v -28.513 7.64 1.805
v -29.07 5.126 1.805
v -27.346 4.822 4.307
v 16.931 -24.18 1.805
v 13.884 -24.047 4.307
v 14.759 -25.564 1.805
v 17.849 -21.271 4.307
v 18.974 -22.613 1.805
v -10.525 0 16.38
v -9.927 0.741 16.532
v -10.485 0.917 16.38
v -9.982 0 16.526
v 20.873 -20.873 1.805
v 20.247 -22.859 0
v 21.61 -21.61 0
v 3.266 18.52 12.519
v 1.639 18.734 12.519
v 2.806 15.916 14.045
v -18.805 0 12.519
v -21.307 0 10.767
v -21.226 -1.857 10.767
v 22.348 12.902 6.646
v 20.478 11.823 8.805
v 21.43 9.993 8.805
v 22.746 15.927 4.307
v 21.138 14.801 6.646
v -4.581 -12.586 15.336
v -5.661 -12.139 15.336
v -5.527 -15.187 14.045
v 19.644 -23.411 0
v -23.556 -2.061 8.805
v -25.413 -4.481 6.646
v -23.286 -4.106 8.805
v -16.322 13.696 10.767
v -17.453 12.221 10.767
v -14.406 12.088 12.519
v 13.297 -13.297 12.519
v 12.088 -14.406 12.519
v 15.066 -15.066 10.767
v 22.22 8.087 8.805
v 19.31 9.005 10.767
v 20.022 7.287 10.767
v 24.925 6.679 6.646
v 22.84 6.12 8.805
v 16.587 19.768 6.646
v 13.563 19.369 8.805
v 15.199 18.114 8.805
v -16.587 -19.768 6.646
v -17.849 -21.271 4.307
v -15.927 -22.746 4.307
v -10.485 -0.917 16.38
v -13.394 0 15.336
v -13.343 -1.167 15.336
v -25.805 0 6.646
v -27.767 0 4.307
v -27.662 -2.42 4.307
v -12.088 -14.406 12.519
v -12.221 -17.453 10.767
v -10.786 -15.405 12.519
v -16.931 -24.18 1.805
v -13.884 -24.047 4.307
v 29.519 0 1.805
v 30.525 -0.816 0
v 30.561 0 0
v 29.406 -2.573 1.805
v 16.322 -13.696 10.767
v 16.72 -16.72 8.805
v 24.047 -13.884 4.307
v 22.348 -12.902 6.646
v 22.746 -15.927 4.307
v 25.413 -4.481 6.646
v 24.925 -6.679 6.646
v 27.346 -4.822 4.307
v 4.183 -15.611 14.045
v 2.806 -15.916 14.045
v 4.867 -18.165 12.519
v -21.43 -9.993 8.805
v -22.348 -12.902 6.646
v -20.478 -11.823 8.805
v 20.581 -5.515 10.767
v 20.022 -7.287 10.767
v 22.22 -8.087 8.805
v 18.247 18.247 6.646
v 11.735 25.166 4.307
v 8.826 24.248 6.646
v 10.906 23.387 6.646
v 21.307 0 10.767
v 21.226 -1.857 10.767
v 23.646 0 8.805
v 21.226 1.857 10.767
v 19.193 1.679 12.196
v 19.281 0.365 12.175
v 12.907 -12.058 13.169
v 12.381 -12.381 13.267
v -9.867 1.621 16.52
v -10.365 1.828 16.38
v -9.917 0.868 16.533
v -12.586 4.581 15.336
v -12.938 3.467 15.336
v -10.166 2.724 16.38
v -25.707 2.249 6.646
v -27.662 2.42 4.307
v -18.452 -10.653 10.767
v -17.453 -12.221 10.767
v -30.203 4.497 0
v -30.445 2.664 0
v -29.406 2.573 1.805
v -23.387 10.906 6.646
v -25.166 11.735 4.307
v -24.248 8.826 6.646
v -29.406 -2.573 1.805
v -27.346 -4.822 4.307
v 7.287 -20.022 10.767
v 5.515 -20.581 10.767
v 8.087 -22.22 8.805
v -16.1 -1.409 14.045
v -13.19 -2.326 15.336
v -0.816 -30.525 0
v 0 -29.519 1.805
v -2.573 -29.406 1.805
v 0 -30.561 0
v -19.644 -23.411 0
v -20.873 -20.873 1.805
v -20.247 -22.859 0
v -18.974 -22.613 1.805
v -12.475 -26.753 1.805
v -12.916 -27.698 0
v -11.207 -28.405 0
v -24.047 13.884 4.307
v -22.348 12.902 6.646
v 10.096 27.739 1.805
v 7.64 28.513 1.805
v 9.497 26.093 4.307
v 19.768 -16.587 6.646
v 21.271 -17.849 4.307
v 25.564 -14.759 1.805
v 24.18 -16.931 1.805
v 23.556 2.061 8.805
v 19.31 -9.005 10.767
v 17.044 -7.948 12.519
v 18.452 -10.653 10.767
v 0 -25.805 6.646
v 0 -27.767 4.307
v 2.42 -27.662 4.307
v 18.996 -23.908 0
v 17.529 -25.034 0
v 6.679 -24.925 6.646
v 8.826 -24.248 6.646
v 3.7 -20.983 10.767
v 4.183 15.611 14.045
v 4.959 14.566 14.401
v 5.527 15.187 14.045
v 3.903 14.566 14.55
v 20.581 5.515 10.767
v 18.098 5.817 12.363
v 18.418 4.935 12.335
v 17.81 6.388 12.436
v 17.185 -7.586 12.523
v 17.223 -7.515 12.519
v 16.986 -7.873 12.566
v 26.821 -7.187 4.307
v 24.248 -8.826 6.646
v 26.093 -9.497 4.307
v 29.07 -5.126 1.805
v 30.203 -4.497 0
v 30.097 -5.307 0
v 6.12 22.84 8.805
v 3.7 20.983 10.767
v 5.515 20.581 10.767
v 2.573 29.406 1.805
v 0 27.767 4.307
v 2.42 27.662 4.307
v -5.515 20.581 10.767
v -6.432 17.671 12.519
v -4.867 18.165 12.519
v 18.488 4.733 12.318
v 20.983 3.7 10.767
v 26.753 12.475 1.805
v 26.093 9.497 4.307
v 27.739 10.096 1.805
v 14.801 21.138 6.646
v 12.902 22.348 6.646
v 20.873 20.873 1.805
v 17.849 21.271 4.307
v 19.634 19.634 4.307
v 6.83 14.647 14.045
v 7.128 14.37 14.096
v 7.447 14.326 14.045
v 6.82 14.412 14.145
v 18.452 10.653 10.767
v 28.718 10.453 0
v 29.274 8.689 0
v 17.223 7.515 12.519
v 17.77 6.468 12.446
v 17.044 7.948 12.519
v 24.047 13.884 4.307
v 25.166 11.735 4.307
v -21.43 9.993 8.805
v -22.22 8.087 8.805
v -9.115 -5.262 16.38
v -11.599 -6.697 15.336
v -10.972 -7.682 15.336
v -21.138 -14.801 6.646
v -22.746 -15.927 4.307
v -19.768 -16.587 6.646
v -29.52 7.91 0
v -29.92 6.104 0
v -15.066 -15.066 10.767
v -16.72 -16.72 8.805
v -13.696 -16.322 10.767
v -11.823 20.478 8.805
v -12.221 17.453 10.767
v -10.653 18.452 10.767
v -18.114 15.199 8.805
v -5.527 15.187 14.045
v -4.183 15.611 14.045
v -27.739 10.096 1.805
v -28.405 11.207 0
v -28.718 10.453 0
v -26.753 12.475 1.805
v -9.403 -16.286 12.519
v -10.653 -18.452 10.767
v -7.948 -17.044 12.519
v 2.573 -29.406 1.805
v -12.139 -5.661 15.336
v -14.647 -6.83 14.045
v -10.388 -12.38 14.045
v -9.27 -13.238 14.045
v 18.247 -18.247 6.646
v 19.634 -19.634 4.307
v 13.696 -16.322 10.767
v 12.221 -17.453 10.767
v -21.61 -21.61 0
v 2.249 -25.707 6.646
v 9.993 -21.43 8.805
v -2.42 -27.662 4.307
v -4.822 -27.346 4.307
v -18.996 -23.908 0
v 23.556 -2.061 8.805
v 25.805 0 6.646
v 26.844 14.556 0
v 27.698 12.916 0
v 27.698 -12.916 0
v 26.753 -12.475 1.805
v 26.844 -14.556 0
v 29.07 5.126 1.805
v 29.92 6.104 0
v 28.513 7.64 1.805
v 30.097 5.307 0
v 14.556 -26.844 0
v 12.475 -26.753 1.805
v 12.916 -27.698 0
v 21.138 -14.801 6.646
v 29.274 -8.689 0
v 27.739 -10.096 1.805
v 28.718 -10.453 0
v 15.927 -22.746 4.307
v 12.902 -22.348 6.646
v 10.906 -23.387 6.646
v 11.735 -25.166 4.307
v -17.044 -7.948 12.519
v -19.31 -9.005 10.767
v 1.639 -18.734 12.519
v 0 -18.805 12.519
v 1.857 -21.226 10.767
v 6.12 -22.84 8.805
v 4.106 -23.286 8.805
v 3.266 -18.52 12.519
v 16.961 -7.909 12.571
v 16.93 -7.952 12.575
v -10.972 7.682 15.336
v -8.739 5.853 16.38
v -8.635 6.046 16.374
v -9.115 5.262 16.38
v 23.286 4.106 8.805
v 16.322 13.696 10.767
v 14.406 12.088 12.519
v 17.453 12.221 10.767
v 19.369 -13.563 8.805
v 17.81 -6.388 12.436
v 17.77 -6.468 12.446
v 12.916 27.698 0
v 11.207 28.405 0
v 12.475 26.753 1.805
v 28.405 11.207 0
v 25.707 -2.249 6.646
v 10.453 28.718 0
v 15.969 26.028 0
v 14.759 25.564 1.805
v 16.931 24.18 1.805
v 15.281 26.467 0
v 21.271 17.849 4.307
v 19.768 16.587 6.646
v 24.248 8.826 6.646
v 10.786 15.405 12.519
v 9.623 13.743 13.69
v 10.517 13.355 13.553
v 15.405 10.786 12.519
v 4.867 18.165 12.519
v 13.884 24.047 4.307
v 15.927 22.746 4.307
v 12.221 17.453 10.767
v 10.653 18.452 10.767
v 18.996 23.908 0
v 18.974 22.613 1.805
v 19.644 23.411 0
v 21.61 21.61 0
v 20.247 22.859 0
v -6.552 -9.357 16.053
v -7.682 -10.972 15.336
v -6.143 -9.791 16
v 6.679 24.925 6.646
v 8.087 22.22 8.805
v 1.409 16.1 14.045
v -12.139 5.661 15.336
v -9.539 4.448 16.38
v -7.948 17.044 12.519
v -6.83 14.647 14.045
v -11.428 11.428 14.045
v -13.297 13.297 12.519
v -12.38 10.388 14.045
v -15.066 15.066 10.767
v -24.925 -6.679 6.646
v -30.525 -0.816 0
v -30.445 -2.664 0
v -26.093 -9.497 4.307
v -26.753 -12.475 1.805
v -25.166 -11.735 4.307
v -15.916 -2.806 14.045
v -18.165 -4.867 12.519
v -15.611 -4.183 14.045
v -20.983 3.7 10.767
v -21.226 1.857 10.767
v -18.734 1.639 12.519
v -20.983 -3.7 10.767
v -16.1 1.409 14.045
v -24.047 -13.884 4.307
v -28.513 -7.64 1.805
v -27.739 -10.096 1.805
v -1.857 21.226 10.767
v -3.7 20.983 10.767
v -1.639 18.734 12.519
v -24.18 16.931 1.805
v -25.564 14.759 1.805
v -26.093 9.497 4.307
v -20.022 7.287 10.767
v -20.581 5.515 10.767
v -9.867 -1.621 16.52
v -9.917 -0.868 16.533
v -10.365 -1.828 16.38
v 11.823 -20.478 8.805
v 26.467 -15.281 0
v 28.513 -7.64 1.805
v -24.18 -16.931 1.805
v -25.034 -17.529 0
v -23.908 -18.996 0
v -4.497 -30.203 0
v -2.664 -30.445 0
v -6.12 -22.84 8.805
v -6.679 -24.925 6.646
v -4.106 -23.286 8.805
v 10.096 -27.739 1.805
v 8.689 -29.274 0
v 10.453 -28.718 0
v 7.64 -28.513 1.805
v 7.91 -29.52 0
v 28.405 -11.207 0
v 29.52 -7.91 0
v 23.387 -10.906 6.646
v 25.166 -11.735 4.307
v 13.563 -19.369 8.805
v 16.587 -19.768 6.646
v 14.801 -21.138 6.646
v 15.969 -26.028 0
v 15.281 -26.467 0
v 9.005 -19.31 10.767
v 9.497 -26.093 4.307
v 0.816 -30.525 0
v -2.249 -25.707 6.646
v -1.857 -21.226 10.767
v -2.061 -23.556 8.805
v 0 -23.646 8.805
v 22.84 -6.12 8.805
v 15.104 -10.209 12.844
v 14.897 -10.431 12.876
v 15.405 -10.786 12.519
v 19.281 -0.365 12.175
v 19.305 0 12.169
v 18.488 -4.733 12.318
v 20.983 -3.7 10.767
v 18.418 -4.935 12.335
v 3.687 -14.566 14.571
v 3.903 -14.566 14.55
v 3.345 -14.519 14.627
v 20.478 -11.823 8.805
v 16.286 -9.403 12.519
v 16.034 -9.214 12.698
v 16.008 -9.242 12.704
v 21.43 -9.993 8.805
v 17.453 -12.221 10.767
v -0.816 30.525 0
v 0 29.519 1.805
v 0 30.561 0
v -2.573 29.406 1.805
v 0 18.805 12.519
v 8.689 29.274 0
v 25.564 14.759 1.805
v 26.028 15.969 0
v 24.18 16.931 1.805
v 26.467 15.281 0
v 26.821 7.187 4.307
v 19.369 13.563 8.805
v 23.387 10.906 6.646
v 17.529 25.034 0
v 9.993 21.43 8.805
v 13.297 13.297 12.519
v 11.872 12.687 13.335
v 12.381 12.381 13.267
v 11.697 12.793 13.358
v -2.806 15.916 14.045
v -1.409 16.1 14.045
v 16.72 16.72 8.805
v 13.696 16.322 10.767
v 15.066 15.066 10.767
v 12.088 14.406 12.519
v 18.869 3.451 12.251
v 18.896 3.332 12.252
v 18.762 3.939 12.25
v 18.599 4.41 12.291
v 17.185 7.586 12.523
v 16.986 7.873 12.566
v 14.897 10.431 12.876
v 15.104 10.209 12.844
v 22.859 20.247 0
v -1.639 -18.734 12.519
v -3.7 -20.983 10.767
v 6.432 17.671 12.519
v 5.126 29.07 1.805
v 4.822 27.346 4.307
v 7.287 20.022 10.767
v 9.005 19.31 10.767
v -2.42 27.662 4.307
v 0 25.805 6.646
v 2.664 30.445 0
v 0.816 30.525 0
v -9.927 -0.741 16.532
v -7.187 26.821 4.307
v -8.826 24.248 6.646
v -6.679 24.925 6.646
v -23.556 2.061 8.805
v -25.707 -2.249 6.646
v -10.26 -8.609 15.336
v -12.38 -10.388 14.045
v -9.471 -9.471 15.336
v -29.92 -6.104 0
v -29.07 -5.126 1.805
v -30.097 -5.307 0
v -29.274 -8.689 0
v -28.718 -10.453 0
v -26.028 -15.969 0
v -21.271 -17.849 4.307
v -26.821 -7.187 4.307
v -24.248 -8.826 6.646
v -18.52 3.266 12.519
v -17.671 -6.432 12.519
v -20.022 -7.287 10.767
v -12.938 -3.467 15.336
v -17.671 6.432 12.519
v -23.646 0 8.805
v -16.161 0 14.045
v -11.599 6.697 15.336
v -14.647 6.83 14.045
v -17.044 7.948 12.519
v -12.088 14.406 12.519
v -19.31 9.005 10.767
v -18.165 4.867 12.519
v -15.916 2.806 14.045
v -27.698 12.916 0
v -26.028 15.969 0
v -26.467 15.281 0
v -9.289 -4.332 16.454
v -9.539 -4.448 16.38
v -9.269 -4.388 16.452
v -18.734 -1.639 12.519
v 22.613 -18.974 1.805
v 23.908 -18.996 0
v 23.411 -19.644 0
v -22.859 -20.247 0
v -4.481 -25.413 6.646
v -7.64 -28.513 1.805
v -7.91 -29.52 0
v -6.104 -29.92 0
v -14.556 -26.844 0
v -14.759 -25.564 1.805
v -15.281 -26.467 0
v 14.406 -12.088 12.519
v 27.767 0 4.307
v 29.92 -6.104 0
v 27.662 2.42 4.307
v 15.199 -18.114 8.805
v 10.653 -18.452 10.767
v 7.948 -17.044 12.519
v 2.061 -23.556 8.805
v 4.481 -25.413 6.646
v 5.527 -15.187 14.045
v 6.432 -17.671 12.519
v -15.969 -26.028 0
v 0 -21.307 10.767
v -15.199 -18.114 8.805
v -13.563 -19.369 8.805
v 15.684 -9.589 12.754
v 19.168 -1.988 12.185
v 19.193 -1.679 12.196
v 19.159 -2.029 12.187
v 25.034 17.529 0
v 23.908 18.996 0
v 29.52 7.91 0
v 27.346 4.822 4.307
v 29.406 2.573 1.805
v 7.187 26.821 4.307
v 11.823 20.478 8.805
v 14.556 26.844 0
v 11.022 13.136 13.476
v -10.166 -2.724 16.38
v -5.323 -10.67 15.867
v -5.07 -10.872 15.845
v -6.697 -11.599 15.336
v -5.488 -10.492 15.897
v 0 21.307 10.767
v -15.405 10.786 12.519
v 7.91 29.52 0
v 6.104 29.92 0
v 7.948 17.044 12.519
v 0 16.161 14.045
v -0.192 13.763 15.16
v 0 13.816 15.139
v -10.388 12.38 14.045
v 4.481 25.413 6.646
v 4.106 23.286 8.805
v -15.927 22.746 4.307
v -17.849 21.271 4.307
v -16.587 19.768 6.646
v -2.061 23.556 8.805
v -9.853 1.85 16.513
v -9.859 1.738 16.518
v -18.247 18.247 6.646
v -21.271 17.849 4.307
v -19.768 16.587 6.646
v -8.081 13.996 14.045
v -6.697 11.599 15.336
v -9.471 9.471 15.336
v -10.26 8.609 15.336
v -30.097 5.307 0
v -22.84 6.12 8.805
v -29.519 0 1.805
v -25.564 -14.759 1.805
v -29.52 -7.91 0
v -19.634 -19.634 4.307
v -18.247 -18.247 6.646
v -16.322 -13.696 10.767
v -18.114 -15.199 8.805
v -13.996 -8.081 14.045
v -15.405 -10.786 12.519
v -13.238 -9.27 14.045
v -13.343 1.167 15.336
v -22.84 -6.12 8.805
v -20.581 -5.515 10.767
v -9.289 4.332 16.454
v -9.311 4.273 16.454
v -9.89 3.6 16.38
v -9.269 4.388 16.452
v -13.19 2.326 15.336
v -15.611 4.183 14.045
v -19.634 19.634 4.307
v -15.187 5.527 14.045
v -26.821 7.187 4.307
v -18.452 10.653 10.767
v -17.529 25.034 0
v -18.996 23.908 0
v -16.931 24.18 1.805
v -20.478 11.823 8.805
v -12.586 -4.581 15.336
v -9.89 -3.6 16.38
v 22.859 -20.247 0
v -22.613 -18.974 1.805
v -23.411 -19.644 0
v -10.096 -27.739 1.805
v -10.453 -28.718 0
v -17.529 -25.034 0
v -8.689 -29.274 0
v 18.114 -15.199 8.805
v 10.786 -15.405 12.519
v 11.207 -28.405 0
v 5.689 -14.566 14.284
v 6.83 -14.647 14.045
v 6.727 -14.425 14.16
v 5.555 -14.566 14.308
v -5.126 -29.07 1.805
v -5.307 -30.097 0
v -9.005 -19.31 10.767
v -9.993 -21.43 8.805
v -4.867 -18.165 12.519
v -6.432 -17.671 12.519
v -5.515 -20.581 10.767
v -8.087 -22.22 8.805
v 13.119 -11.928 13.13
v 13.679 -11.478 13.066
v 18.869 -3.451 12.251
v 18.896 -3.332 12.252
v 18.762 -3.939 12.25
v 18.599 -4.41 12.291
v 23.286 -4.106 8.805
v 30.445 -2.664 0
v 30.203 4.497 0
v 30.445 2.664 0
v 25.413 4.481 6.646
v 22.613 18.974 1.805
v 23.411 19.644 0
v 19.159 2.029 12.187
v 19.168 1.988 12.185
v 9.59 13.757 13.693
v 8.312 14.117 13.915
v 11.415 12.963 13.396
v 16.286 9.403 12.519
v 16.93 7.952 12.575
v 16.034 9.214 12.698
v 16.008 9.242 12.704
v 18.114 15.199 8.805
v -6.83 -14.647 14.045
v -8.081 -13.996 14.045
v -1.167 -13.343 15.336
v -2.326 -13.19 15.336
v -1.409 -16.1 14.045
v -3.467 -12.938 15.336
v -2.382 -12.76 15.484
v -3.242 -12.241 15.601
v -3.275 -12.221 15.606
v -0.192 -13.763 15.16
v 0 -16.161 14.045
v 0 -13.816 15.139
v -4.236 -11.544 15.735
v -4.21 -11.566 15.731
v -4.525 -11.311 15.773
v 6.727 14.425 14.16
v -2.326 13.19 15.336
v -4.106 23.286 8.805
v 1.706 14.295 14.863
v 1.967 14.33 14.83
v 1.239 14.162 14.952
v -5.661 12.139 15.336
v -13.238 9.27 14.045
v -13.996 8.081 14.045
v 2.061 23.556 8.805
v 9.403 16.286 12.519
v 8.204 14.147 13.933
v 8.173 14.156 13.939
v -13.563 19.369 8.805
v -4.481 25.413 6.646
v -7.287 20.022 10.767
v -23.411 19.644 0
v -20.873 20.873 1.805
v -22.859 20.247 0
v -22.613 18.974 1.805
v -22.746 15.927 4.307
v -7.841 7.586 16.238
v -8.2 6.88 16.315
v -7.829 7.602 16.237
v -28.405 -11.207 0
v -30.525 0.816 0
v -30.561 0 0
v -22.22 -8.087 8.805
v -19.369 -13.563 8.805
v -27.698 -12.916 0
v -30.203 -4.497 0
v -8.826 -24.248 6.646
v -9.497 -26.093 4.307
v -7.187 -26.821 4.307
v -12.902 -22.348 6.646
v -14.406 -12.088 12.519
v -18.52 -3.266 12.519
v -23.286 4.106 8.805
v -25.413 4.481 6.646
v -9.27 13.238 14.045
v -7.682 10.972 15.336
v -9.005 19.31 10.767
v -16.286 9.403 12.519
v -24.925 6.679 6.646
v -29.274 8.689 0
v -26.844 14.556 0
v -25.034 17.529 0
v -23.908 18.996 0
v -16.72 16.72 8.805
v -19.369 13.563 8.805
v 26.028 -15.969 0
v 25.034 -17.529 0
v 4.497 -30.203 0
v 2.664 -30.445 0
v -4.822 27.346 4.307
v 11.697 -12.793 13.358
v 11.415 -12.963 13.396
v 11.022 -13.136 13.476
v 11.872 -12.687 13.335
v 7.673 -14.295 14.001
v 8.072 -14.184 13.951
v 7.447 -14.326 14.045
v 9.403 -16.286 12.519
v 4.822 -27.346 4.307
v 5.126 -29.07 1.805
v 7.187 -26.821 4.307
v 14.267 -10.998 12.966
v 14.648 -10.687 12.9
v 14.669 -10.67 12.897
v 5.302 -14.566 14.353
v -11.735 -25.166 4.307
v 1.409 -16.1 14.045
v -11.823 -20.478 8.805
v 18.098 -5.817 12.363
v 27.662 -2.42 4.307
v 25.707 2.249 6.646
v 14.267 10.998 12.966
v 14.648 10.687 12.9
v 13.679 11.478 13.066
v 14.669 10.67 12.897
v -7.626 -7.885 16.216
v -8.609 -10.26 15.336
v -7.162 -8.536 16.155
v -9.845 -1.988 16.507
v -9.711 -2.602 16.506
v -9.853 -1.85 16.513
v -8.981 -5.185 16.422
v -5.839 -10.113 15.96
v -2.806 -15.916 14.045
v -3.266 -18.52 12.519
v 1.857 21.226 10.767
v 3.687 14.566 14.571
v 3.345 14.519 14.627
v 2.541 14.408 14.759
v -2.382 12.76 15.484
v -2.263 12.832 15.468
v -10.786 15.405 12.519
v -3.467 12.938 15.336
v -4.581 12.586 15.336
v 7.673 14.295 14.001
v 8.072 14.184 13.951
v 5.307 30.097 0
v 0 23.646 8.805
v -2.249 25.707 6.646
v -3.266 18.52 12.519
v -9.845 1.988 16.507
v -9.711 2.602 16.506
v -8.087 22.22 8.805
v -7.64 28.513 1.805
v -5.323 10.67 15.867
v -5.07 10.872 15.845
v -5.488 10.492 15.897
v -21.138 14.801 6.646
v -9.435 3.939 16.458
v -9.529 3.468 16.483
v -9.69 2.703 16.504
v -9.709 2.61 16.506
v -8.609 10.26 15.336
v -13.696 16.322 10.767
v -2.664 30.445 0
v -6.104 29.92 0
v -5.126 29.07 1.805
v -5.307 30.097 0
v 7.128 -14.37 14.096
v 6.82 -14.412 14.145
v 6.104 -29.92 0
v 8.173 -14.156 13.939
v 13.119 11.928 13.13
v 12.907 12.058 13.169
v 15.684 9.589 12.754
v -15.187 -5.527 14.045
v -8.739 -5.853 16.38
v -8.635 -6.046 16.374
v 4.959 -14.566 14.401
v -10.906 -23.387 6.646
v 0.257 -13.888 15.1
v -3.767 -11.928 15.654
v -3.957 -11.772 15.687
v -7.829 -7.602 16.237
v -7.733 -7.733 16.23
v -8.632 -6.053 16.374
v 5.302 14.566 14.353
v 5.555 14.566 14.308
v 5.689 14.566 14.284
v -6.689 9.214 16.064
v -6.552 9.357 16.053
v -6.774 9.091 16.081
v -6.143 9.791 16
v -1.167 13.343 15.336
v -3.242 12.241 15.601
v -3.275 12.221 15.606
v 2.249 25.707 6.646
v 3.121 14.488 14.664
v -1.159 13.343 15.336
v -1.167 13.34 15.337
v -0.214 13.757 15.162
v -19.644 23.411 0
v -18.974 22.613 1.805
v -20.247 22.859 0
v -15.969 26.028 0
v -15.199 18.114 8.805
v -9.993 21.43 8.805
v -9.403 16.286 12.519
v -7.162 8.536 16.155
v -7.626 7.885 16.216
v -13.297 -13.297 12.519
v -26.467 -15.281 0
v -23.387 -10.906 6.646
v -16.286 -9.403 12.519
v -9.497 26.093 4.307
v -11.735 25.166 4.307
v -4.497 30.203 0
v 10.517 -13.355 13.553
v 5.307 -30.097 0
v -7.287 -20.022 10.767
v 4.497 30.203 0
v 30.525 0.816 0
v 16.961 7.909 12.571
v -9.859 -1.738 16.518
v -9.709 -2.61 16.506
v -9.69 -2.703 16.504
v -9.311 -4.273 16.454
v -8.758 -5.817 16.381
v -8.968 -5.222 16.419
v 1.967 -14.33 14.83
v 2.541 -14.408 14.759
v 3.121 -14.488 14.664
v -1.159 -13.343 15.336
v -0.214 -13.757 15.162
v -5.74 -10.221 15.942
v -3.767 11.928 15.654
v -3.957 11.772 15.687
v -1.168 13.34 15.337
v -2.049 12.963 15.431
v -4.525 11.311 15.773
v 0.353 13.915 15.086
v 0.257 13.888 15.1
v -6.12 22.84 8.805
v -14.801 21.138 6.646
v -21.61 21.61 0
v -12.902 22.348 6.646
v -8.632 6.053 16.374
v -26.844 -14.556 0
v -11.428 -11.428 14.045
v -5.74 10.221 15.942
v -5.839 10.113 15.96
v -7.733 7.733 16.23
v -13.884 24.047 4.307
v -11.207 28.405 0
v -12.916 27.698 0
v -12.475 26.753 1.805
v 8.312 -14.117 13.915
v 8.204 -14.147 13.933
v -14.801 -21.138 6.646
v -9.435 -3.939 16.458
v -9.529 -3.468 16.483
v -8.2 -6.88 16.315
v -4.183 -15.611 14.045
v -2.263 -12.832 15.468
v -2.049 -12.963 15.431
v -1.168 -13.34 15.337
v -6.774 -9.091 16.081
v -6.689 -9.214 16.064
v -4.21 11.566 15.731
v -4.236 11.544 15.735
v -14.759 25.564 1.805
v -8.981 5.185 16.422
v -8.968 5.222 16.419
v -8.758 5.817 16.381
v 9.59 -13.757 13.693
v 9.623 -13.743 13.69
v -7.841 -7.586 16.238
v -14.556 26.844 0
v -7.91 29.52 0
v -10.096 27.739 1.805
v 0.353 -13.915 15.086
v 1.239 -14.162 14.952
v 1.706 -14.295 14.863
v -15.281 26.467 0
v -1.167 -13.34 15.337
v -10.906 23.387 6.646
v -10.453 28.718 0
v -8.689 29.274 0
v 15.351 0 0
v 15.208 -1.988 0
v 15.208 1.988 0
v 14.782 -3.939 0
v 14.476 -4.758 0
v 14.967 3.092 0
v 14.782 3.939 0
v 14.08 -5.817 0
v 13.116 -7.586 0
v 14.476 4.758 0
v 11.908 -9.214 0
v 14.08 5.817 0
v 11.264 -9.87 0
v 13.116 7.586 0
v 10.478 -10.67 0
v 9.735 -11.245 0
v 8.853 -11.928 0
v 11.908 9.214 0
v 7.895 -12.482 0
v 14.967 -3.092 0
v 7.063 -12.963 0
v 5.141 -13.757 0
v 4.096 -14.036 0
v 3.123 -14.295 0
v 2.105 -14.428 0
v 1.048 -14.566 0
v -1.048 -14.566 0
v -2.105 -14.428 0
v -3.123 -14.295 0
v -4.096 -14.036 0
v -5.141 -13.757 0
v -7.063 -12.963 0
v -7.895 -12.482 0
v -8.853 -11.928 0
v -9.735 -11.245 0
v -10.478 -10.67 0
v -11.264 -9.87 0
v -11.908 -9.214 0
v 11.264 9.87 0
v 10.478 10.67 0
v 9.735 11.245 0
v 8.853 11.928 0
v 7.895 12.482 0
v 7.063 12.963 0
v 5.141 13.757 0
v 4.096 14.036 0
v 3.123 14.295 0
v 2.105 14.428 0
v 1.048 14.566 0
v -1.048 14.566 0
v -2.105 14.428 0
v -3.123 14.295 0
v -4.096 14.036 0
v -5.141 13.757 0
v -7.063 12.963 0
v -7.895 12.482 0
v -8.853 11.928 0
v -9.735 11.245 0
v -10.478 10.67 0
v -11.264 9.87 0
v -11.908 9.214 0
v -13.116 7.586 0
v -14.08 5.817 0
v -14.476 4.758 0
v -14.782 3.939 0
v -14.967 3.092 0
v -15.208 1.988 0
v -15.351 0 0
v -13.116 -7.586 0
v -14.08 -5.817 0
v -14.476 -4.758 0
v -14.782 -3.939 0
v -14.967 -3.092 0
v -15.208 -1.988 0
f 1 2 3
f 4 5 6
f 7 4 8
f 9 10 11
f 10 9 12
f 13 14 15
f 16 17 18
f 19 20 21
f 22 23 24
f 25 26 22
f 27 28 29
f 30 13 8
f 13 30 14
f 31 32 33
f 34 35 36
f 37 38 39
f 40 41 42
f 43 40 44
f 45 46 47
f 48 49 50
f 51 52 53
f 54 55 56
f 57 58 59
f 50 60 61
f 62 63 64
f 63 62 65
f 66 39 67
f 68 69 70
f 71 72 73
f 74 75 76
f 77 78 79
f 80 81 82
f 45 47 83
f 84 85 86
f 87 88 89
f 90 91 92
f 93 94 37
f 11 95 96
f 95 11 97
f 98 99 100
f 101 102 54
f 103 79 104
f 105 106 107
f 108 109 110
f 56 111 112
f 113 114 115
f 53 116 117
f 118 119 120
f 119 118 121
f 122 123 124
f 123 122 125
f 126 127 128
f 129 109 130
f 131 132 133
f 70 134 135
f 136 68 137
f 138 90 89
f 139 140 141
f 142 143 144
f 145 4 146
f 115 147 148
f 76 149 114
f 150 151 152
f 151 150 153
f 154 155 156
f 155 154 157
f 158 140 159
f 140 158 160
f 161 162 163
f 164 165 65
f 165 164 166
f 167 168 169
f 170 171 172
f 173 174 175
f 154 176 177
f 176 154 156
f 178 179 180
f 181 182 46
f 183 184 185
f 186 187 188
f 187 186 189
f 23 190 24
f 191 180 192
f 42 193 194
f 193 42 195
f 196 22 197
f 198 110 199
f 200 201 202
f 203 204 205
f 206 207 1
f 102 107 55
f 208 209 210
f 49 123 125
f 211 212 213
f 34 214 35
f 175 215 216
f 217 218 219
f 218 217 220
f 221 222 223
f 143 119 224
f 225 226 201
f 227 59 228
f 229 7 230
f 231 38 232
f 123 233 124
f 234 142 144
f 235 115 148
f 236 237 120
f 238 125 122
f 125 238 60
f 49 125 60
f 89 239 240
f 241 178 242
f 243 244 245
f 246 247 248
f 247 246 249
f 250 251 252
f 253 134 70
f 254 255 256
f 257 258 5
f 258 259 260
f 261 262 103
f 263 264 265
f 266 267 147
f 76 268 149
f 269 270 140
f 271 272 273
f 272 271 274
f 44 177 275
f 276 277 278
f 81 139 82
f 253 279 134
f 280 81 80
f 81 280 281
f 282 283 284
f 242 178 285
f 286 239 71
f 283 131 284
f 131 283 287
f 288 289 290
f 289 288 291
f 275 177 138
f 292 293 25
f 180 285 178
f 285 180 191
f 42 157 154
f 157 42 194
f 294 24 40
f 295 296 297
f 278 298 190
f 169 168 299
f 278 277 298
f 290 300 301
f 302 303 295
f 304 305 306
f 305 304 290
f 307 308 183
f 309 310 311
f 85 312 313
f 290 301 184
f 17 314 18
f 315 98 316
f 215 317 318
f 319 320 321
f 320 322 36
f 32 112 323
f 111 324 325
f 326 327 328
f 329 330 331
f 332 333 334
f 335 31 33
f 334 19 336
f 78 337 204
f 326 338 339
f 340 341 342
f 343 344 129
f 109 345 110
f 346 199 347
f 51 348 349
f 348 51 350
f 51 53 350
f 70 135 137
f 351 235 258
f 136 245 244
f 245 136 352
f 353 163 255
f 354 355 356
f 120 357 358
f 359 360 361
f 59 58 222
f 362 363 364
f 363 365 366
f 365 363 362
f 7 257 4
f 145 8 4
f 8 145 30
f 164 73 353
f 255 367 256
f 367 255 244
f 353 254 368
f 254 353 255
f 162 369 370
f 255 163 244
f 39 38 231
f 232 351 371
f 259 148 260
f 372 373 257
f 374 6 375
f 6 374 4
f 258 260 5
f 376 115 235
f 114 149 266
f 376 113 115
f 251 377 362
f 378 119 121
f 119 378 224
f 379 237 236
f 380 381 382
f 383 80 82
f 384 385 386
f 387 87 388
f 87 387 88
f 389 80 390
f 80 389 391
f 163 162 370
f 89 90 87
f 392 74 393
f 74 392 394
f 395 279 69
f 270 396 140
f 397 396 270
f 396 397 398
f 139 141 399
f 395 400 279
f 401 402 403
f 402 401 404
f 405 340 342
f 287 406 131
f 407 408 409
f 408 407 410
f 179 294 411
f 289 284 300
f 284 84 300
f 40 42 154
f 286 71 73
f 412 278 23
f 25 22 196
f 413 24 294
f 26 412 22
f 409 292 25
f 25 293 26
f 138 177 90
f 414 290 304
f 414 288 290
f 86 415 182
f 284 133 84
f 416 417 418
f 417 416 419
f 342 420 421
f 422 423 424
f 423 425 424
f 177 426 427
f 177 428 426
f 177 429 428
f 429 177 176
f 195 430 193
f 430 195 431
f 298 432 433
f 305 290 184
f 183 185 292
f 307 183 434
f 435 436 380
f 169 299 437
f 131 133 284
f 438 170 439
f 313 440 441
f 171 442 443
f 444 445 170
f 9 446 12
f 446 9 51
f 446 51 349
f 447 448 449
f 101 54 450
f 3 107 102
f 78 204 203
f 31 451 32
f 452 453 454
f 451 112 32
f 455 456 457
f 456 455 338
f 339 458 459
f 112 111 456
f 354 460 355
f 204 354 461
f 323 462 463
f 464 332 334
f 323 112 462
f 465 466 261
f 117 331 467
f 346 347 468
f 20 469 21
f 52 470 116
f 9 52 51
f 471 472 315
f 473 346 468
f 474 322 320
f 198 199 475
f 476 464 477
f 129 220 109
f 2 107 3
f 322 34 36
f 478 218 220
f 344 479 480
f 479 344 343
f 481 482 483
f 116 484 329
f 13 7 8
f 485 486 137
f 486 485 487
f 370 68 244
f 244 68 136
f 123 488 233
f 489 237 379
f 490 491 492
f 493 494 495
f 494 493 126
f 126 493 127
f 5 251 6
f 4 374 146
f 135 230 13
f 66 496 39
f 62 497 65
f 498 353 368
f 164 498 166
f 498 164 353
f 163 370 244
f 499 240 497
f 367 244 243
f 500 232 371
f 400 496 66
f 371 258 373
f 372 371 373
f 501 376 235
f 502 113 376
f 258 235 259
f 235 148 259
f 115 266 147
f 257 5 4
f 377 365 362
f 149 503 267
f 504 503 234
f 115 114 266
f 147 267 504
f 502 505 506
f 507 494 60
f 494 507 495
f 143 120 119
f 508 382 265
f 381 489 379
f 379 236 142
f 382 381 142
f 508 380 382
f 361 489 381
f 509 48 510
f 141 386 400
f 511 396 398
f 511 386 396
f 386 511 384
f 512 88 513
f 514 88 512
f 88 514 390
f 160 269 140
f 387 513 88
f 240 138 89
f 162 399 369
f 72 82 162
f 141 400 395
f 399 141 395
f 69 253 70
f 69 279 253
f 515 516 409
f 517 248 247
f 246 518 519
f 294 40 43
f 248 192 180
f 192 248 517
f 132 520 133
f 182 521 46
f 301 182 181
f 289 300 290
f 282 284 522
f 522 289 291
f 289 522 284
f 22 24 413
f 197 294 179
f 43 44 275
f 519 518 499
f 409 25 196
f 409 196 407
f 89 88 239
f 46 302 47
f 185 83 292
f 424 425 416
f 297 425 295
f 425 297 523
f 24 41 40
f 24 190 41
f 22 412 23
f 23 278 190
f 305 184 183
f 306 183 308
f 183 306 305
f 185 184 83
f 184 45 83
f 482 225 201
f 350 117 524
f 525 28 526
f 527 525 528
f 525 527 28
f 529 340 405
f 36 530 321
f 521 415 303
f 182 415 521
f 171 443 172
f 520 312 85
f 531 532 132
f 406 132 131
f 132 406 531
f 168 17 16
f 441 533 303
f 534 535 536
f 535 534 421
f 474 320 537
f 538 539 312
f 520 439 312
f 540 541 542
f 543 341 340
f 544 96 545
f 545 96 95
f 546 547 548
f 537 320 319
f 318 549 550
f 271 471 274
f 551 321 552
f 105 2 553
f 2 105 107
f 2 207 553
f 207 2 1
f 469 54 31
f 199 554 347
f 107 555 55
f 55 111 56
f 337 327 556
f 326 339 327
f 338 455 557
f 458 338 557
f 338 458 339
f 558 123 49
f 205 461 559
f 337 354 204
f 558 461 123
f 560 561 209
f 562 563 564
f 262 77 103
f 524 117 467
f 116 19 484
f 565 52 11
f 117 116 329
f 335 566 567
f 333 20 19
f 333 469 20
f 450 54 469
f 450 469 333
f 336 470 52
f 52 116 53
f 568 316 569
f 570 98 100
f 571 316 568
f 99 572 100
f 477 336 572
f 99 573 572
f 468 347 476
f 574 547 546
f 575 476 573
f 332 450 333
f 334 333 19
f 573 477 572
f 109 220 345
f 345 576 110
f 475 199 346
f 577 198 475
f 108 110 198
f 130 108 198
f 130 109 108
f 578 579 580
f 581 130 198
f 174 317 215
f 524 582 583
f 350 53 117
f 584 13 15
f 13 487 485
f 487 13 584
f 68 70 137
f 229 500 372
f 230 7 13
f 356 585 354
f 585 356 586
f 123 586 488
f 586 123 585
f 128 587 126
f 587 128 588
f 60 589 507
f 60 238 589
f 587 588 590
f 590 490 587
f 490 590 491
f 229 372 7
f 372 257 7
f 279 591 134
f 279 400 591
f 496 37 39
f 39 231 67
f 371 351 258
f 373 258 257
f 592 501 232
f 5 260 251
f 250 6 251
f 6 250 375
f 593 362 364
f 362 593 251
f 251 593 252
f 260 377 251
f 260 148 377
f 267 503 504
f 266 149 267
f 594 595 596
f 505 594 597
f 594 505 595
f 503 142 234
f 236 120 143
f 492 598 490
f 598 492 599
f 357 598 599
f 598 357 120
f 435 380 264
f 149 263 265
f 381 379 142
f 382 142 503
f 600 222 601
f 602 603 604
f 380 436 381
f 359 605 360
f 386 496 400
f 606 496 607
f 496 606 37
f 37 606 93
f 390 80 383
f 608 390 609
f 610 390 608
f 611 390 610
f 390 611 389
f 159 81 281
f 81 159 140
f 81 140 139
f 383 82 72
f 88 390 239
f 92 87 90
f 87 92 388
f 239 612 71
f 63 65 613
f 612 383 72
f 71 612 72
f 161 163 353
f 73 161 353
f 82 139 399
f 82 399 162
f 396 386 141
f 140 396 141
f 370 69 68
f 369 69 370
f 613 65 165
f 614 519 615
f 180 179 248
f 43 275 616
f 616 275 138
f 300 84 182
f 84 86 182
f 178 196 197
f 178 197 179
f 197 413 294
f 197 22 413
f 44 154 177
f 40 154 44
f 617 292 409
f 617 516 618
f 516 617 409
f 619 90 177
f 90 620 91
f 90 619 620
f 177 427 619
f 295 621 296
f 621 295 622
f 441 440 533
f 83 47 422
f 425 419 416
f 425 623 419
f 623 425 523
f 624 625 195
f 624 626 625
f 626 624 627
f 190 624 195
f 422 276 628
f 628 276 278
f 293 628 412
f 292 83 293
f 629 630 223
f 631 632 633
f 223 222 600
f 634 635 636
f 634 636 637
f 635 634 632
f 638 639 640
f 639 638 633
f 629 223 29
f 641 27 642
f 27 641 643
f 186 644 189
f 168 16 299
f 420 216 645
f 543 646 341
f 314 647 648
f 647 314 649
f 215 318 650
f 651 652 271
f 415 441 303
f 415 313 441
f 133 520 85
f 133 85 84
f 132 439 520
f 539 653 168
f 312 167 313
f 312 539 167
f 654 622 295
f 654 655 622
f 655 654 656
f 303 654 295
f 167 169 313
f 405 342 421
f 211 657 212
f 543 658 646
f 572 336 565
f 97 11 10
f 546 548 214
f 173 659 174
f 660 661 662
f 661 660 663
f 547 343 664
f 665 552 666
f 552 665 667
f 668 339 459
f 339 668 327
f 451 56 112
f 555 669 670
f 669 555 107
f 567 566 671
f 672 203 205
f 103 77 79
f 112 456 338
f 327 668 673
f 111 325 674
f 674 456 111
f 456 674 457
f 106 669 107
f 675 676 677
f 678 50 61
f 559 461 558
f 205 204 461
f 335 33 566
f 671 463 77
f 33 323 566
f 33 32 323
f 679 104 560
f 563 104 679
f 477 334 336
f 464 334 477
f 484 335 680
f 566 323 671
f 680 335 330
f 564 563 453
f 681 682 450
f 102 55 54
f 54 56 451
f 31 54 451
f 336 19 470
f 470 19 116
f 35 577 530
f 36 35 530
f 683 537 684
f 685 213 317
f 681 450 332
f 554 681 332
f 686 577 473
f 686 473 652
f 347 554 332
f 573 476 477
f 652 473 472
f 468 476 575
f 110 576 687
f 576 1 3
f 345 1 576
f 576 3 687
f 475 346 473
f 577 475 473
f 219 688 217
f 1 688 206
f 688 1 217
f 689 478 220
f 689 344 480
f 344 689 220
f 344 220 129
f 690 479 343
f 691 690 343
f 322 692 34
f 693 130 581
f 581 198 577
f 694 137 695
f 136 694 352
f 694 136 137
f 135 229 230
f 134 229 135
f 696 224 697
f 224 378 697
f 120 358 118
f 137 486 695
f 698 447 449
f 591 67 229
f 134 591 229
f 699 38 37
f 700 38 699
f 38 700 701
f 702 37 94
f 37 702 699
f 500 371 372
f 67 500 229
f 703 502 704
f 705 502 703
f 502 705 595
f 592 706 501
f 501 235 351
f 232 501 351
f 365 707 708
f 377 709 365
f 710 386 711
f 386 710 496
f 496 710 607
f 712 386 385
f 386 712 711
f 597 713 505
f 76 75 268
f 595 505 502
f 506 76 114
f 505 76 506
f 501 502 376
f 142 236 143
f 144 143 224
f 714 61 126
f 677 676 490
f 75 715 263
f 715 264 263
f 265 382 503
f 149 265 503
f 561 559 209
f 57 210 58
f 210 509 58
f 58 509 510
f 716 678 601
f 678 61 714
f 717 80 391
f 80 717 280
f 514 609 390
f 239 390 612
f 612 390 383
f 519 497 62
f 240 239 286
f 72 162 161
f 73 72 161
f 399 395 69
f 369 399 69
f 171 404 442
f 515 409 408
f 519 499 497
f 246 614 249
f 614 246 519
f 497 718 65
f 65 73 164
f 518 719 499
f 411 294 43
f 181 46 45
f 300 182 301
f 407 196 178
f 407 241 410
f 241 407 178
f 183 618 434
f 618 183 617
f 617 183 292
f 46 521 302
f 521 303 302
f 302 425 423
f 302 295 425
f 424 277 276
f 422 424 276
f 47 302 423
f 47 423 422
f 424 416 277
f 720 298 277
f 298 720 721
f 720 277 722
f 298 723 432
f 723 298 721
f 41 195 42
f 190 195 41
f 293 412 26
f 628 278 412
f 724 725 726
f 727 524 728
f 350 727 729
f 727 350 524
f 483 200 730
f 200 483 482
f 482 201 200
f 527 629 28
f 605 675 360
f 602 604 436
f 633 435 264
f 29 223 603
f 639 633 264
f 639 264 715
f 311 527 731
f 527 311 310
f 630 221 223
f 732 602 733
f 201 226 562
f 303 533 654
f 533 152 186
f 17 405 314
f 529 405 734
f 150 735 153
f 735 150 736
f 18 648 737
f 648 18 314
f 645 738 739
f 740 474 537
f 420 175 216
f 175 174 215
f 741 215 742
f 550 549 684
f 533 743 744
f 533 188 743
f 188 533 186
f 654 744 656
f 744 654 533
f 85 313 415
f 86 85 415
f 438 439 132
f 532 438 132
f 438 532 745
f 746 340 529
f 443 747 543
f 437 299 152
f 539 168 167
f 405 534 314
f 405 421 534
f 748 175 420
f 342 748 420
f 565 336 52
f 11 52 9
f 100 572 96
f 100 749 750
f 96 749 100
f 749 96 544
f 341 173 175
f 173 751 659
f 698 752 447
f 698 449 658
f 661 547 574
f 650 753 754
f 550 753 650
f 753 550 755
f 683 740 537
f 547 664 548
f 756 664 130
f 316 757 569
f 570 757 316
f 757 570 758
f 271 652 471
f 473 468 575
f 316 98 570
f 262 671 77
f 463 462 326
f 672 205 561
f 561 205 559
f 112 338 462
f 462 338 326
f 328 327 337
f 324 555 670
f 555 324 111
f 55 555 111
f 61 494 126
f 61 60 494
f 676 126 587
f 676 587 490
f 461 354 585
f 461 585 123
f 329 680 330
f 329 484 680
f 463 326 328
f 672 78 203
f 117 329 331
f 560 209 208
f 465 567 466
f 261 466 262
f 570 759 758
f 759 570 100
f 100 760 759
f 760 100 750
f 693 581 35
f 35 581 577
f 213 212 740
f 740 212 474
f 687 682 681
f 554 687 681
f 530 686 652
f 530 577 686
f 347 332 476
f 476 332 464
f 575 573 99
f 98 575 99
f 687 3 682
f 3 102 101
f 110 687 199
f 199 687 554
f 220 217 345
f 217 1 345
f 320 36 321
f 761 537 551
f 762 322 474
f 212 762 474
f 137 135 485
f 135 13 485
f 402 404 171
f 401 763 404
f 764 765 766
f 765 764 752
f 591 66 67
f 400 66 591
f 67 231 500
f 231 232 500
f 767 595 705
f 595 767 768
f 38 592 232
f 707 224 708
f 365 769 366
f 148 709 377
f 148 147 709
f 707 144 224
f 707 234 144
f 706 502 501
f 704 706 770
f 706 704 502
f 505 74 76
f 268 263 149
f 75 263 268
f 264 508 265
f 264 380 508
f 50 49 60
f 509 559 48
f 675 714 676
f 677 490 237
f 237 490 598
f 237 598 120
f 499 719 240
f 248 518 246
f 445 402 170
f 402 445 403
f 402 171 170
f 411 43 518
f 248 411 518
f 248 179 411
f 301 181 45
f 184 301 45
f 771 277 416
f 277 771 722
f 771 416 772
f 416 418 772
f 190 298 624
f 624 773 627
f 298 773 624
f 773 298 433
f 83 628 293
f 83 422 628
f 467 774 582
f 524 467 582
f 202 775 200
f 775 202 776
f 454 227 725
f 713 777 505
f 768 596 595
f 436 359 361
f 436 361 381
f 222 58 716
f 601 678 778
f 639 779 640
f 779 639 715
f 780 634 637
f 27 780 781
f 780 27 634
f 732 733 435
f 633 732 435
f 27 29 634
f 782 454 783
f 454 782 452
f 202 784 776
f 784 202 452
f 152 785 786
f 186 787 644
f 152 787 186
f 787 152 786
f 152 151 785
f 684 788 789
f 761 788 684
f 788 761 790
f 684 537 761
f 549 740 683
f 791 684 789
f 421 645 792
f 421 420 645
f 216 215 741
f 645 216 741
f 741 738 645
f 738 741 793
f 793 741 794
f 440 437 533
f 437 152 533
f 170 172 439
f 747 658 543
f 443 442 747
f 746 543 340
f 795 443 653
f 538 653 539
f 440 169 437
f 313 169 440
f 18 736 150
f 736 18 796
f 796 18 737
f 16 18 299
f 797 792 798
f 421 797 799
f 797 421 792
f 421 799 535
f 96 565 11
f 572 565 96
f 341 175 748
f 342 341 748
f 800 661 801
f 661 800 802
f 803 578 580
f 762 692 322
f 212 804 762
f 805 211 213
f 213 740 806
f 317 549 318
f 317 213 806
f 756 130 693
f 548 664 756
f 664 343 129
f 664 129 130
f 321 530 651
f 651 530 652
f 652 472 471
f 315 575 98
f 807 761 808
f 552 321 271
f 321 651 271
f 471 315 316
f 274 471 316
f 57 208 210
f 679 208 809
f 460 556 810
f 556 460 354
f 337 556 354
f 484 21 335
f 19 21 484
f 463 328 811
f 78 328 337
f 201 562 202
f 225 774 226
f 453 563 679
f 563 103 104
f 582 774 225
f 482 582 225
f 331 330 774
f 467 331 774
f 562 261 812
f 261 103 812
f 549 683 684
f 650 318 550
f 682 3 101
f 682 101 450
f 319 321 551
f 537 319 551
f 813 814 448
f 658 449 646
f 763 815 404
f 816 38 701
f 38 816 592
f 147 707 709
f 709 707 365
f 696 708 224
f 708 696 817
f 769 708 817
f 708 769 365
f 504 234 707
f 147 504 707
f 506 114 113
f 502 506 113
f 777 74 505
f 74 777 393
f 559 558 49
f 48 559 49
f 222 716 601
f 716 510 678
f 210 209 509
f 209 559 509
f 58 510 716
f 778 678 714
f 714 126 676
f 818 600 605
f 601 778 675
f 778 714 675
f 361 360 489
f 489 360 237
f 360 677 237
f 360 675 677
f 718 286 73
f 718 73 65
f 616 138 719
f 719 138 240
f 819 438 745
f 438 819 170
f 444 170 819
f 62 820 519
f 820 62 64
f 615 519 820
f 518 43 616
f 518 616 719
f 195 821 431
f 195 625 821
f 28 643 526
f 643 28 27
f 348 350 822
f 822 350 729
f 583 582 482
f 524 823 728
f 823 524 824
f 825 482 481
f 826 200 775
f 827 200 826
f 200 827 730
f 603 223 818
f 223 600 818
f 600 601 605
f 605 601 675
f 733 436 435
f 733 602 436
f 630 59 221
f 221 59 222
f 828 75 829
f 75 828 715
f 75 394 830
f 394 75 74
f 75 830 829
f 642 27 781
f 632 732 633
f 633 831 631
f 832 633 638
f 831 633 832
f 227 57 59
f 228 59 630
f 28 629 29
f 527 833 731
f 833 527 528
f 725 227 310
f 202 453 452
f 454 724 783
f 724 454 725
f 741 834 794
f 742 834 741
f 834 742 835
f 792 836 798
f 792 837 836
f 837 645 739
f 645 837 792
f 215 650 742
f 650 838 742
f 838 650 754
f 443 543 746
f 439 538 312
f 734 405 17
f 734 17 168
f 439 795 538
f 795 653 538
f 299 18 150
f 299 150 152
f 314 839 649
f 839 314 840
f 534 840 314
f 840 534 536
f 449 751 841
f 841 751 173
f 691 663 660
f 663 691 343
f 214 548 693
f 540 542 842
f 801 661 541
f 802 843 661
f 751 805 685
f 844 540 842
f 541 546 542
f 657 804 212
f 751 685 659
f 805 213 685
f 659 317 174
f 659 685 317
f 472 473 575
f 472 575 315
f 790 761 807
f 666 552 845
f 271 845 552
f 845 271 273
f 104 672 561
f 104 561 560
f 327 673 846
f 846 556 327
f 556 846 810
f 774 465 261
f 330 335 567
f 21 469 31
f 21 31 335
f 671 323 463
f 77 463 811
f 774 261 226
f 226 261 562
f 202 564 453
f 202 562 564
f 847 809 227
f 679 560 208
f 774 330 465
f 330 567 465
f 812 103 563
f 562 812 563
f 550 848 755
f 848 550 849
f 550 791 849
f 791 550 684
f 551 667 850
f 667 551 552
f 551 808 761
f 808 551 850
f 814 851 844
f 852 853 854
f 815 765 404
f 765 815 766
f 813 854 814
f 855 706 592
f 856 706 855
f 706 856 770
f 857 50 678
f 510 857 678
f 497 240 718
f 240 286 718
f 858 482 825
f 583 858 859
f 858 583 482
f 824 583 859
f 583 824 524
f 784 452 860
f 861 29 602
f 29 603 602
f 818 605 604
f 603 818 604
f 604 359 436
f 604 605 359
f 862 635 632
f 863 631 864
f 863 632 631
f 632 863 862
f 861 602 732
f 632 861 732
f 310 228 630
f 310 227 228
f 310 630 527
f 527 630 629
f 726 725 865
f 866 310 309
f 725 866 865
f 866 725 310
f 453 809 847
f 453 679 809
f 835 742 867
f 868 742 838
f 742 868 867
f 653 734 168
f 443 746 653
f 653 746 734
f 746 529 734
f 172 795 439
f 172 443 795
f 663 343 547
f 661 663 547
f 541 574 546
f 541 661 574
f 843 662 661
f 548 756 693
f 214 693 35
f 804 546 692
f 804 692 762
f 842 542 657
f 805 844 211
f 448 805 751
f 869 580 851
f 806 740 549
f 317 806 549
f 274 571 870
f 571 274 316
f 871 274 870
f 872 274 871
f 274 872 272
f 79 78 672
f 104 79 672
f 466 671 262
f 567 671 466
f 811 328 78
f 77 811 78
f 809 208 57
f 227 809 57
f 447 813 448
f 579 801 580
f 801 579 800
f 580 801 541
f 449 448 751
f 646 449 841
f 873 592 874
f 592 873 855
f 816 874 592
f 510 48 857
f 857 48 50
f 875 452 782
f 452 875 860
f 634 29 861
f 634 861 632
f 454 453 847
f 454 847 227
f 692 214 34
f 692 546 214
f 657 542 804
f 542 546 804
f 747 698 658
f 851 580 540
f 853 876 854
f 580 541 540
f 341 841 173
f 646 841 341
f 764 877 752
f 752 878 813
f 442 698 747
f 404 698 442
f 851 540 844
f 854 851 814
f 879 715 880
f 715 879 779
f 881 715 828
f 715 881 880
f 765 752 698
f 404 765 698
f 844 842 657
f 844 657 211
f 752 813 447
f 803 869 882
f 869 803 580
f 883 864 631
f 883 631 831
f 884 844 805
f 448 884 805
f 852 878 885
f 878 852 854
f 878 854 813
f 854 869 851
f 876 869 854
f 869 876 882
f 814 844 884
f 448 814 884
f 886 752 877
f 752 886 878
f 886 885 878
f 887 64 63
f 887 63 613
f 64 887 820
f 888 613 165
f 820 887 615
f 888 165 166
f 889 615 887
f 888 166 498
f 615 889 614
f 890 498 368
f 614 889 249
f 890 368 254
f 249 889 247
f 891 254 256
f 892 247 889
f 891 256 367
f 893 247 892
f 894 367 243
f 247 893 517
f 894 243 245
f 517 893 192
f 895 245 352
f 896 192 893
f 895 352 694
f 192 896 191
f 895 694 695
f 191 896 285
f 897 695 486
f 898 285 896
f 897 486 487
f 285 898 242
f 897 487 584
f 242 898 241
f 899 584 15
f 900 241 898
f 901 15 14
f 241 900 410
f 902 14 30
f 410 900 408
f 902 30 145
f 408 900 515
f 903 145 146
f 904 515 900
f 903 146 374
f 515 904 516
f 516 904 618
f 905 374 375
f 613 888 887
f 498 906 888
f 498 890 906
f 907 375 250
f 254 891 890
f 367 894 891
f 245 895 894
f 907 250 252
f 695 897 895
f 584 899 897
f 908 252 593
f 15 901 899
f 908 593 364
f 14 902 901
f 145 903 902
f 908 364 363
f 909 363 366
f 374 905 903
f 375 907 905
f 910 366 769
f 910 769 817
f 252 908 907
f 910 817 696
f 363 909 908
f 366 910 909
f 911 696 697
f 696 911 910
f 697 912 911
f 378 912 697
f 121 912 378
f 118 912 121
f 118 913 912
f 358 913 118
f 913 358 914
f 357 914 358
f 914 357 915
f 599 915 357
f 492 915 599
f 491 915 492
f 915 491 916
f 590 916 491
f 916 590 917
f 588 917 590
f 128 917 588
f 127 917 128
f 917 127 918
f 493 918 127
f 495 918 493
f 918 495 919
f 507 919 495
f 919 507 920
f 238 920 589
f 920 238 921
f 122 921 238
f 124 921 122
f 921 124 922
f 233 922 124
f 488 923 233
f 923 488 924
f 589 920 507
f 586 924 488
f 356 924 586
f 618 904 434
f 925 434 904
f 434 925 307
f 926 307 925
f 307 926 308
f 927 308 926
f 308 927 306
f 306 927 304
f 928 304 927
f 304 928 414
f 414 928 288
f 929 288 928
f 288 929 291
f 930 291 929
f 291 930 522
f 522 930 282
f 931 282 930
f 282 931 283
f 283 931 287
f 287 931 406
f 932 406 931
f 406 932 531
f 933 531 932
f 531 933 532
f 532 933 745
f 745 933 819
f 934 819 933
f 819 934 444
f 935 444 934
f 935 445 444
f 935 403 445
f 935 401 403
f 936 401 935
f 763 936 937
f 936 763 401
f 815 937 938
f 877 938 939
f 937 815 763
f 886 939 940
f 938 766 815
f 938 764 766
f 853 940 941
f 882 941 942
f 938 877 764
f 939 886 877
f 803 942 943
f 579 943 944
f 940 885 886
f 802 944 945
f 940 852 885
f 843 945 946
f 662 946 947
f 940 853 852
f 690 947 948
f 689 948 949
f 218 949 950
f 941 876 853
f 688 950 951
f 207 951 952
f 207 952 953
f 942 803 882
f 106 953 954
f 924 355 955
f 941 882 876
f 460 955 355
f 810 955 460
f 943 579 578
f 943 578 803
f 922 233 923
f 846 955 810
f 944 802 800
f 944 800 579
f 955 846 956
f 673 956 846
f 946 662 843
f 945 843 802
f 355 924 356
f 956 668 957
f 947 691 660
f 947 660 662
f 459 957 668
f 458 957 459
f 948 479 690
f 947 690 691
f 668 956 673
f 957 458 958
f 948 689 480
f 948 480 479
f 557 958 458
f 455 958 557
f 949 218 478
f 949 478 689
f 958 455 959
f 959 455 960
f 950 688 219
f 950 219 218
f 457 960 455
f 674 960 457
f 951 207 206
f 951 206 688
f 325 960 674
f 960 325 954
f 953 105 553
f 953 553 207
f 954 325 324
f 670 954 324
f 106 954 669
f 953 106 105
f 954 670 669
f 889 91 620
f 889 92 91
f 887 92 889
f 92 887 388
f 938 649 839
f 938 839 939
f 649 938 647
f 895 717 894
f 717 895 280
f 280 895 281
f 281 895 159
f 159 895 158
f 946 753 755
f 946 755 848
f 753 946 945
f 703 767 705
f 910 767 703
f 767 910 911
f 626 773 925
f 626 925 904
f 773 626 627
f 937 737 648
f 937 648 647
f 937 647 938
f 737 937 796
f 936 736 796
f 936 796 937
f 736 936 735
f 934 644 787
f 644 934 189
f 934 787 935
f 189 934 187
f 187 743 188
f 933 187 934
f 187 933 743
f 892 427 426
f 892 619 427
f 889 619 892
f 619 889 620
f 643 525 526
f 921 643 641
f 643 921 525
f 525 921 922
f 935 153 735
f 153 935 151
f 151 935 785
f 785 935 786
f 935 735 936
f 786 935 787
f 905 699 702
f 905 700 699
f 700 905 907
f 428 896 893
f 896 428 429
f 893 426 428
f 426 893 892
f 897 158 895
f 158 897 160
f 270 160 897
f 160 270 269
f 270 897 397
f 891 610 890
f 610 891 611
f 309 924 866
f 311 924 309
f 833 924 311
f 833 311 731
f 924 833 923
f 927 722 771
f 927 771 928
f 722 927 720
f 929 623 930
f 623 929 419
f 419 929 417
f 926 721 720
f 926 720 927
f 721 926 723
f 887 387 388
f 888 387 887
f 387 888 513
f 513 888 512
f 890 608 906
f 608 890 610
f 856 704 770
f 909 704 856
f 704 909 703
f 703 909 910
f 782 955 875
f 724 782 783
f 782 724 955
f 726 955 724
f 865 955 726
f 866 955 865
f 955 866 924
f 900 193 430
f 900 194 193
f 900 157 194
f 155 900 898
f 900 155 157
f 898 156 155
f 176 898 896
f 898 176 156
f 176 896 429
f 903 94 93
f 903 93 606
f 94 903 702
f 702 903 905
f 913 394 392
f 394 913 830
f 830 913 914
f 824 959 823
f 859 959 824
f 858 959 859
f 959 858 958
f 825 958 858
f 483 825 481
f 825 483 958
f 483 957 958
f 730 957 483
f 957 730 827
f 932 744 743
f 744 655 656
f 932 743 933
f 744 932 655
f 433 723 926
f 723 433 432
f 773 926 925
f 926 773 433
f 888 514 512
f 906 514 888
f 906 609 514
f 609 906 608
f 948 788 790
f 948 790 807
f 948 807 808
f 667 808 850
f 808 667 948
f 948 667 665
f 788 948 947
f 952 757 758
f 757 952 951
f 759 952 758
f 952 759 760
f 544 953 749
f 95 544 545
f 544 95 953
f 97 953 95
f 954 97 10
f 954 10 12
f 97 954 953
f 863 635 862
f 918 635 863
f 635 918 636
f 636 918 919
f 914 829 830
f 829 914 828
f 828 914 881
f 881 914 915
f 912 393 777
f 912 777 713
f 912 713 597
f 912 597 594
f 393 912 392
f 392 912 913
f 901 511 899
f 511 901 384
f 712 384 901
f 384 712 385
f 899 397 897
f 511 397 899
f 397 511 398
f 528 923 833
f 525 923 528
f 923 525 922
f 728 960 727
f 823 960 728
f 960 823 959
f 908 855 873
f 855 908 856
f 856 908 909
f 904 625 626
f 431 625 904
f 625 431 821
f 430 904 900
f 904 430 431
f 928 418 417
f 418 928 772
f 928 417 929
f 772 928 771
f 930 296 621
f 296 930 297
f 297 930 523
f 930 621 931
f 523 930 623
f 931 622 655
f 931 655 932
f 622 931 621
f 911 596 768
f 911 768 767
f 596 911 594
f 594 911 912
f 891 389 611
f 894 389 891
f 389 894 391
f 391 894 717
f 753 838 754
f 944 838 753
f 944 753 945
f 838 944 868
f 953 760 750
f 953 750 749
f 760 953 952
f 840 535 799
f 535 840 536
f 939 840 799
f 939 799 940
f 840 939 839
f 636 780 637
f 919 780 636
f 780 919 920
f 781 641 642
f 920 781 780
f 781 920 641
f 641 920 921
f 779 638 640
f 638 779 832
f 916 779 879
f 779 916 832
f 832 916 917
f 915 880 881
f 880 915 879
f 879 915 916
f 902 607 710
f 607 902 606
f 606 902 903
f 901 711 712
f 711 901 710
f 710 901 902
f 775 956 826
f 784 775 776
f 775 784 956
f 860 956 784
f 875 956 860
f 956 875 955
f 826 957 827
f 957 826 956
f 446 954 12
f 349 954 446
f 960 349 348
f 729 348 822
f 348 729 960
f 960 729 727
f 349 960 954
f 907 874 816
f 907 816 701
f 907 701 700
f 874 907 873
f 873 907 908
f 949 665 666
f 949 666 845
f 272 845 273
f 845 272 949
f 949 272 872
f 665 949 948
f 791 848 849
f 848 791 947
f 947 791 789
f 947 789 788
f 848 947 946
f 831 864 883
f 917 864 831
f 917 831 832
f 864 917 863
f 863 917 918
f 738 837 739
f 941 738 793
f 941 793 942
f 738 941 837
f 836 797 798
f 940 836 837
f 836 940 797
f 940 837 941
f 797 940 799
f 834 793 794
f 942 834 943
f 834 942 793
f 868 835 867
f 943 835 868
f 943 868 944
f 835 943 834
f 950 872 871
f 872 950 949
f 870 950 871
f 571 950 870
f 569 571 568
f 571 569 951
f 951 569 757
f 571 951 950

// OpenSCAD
$fa = 5;
radius = 35;
angle = 72;
chord = 18;
tubeDiameter = 29.2;

module partSphere() {
    translate([0,0,chord-radius])
    difference() {
        sphere(radius);
        translate([0,0,-chord])
            cube(radius*2, center = true);
    }
}

difference() {
    partSphere();
    rotate([0,90-angle,0])
        cylinder(h=2*radius, d = tubeDiameter, center=true);
}
